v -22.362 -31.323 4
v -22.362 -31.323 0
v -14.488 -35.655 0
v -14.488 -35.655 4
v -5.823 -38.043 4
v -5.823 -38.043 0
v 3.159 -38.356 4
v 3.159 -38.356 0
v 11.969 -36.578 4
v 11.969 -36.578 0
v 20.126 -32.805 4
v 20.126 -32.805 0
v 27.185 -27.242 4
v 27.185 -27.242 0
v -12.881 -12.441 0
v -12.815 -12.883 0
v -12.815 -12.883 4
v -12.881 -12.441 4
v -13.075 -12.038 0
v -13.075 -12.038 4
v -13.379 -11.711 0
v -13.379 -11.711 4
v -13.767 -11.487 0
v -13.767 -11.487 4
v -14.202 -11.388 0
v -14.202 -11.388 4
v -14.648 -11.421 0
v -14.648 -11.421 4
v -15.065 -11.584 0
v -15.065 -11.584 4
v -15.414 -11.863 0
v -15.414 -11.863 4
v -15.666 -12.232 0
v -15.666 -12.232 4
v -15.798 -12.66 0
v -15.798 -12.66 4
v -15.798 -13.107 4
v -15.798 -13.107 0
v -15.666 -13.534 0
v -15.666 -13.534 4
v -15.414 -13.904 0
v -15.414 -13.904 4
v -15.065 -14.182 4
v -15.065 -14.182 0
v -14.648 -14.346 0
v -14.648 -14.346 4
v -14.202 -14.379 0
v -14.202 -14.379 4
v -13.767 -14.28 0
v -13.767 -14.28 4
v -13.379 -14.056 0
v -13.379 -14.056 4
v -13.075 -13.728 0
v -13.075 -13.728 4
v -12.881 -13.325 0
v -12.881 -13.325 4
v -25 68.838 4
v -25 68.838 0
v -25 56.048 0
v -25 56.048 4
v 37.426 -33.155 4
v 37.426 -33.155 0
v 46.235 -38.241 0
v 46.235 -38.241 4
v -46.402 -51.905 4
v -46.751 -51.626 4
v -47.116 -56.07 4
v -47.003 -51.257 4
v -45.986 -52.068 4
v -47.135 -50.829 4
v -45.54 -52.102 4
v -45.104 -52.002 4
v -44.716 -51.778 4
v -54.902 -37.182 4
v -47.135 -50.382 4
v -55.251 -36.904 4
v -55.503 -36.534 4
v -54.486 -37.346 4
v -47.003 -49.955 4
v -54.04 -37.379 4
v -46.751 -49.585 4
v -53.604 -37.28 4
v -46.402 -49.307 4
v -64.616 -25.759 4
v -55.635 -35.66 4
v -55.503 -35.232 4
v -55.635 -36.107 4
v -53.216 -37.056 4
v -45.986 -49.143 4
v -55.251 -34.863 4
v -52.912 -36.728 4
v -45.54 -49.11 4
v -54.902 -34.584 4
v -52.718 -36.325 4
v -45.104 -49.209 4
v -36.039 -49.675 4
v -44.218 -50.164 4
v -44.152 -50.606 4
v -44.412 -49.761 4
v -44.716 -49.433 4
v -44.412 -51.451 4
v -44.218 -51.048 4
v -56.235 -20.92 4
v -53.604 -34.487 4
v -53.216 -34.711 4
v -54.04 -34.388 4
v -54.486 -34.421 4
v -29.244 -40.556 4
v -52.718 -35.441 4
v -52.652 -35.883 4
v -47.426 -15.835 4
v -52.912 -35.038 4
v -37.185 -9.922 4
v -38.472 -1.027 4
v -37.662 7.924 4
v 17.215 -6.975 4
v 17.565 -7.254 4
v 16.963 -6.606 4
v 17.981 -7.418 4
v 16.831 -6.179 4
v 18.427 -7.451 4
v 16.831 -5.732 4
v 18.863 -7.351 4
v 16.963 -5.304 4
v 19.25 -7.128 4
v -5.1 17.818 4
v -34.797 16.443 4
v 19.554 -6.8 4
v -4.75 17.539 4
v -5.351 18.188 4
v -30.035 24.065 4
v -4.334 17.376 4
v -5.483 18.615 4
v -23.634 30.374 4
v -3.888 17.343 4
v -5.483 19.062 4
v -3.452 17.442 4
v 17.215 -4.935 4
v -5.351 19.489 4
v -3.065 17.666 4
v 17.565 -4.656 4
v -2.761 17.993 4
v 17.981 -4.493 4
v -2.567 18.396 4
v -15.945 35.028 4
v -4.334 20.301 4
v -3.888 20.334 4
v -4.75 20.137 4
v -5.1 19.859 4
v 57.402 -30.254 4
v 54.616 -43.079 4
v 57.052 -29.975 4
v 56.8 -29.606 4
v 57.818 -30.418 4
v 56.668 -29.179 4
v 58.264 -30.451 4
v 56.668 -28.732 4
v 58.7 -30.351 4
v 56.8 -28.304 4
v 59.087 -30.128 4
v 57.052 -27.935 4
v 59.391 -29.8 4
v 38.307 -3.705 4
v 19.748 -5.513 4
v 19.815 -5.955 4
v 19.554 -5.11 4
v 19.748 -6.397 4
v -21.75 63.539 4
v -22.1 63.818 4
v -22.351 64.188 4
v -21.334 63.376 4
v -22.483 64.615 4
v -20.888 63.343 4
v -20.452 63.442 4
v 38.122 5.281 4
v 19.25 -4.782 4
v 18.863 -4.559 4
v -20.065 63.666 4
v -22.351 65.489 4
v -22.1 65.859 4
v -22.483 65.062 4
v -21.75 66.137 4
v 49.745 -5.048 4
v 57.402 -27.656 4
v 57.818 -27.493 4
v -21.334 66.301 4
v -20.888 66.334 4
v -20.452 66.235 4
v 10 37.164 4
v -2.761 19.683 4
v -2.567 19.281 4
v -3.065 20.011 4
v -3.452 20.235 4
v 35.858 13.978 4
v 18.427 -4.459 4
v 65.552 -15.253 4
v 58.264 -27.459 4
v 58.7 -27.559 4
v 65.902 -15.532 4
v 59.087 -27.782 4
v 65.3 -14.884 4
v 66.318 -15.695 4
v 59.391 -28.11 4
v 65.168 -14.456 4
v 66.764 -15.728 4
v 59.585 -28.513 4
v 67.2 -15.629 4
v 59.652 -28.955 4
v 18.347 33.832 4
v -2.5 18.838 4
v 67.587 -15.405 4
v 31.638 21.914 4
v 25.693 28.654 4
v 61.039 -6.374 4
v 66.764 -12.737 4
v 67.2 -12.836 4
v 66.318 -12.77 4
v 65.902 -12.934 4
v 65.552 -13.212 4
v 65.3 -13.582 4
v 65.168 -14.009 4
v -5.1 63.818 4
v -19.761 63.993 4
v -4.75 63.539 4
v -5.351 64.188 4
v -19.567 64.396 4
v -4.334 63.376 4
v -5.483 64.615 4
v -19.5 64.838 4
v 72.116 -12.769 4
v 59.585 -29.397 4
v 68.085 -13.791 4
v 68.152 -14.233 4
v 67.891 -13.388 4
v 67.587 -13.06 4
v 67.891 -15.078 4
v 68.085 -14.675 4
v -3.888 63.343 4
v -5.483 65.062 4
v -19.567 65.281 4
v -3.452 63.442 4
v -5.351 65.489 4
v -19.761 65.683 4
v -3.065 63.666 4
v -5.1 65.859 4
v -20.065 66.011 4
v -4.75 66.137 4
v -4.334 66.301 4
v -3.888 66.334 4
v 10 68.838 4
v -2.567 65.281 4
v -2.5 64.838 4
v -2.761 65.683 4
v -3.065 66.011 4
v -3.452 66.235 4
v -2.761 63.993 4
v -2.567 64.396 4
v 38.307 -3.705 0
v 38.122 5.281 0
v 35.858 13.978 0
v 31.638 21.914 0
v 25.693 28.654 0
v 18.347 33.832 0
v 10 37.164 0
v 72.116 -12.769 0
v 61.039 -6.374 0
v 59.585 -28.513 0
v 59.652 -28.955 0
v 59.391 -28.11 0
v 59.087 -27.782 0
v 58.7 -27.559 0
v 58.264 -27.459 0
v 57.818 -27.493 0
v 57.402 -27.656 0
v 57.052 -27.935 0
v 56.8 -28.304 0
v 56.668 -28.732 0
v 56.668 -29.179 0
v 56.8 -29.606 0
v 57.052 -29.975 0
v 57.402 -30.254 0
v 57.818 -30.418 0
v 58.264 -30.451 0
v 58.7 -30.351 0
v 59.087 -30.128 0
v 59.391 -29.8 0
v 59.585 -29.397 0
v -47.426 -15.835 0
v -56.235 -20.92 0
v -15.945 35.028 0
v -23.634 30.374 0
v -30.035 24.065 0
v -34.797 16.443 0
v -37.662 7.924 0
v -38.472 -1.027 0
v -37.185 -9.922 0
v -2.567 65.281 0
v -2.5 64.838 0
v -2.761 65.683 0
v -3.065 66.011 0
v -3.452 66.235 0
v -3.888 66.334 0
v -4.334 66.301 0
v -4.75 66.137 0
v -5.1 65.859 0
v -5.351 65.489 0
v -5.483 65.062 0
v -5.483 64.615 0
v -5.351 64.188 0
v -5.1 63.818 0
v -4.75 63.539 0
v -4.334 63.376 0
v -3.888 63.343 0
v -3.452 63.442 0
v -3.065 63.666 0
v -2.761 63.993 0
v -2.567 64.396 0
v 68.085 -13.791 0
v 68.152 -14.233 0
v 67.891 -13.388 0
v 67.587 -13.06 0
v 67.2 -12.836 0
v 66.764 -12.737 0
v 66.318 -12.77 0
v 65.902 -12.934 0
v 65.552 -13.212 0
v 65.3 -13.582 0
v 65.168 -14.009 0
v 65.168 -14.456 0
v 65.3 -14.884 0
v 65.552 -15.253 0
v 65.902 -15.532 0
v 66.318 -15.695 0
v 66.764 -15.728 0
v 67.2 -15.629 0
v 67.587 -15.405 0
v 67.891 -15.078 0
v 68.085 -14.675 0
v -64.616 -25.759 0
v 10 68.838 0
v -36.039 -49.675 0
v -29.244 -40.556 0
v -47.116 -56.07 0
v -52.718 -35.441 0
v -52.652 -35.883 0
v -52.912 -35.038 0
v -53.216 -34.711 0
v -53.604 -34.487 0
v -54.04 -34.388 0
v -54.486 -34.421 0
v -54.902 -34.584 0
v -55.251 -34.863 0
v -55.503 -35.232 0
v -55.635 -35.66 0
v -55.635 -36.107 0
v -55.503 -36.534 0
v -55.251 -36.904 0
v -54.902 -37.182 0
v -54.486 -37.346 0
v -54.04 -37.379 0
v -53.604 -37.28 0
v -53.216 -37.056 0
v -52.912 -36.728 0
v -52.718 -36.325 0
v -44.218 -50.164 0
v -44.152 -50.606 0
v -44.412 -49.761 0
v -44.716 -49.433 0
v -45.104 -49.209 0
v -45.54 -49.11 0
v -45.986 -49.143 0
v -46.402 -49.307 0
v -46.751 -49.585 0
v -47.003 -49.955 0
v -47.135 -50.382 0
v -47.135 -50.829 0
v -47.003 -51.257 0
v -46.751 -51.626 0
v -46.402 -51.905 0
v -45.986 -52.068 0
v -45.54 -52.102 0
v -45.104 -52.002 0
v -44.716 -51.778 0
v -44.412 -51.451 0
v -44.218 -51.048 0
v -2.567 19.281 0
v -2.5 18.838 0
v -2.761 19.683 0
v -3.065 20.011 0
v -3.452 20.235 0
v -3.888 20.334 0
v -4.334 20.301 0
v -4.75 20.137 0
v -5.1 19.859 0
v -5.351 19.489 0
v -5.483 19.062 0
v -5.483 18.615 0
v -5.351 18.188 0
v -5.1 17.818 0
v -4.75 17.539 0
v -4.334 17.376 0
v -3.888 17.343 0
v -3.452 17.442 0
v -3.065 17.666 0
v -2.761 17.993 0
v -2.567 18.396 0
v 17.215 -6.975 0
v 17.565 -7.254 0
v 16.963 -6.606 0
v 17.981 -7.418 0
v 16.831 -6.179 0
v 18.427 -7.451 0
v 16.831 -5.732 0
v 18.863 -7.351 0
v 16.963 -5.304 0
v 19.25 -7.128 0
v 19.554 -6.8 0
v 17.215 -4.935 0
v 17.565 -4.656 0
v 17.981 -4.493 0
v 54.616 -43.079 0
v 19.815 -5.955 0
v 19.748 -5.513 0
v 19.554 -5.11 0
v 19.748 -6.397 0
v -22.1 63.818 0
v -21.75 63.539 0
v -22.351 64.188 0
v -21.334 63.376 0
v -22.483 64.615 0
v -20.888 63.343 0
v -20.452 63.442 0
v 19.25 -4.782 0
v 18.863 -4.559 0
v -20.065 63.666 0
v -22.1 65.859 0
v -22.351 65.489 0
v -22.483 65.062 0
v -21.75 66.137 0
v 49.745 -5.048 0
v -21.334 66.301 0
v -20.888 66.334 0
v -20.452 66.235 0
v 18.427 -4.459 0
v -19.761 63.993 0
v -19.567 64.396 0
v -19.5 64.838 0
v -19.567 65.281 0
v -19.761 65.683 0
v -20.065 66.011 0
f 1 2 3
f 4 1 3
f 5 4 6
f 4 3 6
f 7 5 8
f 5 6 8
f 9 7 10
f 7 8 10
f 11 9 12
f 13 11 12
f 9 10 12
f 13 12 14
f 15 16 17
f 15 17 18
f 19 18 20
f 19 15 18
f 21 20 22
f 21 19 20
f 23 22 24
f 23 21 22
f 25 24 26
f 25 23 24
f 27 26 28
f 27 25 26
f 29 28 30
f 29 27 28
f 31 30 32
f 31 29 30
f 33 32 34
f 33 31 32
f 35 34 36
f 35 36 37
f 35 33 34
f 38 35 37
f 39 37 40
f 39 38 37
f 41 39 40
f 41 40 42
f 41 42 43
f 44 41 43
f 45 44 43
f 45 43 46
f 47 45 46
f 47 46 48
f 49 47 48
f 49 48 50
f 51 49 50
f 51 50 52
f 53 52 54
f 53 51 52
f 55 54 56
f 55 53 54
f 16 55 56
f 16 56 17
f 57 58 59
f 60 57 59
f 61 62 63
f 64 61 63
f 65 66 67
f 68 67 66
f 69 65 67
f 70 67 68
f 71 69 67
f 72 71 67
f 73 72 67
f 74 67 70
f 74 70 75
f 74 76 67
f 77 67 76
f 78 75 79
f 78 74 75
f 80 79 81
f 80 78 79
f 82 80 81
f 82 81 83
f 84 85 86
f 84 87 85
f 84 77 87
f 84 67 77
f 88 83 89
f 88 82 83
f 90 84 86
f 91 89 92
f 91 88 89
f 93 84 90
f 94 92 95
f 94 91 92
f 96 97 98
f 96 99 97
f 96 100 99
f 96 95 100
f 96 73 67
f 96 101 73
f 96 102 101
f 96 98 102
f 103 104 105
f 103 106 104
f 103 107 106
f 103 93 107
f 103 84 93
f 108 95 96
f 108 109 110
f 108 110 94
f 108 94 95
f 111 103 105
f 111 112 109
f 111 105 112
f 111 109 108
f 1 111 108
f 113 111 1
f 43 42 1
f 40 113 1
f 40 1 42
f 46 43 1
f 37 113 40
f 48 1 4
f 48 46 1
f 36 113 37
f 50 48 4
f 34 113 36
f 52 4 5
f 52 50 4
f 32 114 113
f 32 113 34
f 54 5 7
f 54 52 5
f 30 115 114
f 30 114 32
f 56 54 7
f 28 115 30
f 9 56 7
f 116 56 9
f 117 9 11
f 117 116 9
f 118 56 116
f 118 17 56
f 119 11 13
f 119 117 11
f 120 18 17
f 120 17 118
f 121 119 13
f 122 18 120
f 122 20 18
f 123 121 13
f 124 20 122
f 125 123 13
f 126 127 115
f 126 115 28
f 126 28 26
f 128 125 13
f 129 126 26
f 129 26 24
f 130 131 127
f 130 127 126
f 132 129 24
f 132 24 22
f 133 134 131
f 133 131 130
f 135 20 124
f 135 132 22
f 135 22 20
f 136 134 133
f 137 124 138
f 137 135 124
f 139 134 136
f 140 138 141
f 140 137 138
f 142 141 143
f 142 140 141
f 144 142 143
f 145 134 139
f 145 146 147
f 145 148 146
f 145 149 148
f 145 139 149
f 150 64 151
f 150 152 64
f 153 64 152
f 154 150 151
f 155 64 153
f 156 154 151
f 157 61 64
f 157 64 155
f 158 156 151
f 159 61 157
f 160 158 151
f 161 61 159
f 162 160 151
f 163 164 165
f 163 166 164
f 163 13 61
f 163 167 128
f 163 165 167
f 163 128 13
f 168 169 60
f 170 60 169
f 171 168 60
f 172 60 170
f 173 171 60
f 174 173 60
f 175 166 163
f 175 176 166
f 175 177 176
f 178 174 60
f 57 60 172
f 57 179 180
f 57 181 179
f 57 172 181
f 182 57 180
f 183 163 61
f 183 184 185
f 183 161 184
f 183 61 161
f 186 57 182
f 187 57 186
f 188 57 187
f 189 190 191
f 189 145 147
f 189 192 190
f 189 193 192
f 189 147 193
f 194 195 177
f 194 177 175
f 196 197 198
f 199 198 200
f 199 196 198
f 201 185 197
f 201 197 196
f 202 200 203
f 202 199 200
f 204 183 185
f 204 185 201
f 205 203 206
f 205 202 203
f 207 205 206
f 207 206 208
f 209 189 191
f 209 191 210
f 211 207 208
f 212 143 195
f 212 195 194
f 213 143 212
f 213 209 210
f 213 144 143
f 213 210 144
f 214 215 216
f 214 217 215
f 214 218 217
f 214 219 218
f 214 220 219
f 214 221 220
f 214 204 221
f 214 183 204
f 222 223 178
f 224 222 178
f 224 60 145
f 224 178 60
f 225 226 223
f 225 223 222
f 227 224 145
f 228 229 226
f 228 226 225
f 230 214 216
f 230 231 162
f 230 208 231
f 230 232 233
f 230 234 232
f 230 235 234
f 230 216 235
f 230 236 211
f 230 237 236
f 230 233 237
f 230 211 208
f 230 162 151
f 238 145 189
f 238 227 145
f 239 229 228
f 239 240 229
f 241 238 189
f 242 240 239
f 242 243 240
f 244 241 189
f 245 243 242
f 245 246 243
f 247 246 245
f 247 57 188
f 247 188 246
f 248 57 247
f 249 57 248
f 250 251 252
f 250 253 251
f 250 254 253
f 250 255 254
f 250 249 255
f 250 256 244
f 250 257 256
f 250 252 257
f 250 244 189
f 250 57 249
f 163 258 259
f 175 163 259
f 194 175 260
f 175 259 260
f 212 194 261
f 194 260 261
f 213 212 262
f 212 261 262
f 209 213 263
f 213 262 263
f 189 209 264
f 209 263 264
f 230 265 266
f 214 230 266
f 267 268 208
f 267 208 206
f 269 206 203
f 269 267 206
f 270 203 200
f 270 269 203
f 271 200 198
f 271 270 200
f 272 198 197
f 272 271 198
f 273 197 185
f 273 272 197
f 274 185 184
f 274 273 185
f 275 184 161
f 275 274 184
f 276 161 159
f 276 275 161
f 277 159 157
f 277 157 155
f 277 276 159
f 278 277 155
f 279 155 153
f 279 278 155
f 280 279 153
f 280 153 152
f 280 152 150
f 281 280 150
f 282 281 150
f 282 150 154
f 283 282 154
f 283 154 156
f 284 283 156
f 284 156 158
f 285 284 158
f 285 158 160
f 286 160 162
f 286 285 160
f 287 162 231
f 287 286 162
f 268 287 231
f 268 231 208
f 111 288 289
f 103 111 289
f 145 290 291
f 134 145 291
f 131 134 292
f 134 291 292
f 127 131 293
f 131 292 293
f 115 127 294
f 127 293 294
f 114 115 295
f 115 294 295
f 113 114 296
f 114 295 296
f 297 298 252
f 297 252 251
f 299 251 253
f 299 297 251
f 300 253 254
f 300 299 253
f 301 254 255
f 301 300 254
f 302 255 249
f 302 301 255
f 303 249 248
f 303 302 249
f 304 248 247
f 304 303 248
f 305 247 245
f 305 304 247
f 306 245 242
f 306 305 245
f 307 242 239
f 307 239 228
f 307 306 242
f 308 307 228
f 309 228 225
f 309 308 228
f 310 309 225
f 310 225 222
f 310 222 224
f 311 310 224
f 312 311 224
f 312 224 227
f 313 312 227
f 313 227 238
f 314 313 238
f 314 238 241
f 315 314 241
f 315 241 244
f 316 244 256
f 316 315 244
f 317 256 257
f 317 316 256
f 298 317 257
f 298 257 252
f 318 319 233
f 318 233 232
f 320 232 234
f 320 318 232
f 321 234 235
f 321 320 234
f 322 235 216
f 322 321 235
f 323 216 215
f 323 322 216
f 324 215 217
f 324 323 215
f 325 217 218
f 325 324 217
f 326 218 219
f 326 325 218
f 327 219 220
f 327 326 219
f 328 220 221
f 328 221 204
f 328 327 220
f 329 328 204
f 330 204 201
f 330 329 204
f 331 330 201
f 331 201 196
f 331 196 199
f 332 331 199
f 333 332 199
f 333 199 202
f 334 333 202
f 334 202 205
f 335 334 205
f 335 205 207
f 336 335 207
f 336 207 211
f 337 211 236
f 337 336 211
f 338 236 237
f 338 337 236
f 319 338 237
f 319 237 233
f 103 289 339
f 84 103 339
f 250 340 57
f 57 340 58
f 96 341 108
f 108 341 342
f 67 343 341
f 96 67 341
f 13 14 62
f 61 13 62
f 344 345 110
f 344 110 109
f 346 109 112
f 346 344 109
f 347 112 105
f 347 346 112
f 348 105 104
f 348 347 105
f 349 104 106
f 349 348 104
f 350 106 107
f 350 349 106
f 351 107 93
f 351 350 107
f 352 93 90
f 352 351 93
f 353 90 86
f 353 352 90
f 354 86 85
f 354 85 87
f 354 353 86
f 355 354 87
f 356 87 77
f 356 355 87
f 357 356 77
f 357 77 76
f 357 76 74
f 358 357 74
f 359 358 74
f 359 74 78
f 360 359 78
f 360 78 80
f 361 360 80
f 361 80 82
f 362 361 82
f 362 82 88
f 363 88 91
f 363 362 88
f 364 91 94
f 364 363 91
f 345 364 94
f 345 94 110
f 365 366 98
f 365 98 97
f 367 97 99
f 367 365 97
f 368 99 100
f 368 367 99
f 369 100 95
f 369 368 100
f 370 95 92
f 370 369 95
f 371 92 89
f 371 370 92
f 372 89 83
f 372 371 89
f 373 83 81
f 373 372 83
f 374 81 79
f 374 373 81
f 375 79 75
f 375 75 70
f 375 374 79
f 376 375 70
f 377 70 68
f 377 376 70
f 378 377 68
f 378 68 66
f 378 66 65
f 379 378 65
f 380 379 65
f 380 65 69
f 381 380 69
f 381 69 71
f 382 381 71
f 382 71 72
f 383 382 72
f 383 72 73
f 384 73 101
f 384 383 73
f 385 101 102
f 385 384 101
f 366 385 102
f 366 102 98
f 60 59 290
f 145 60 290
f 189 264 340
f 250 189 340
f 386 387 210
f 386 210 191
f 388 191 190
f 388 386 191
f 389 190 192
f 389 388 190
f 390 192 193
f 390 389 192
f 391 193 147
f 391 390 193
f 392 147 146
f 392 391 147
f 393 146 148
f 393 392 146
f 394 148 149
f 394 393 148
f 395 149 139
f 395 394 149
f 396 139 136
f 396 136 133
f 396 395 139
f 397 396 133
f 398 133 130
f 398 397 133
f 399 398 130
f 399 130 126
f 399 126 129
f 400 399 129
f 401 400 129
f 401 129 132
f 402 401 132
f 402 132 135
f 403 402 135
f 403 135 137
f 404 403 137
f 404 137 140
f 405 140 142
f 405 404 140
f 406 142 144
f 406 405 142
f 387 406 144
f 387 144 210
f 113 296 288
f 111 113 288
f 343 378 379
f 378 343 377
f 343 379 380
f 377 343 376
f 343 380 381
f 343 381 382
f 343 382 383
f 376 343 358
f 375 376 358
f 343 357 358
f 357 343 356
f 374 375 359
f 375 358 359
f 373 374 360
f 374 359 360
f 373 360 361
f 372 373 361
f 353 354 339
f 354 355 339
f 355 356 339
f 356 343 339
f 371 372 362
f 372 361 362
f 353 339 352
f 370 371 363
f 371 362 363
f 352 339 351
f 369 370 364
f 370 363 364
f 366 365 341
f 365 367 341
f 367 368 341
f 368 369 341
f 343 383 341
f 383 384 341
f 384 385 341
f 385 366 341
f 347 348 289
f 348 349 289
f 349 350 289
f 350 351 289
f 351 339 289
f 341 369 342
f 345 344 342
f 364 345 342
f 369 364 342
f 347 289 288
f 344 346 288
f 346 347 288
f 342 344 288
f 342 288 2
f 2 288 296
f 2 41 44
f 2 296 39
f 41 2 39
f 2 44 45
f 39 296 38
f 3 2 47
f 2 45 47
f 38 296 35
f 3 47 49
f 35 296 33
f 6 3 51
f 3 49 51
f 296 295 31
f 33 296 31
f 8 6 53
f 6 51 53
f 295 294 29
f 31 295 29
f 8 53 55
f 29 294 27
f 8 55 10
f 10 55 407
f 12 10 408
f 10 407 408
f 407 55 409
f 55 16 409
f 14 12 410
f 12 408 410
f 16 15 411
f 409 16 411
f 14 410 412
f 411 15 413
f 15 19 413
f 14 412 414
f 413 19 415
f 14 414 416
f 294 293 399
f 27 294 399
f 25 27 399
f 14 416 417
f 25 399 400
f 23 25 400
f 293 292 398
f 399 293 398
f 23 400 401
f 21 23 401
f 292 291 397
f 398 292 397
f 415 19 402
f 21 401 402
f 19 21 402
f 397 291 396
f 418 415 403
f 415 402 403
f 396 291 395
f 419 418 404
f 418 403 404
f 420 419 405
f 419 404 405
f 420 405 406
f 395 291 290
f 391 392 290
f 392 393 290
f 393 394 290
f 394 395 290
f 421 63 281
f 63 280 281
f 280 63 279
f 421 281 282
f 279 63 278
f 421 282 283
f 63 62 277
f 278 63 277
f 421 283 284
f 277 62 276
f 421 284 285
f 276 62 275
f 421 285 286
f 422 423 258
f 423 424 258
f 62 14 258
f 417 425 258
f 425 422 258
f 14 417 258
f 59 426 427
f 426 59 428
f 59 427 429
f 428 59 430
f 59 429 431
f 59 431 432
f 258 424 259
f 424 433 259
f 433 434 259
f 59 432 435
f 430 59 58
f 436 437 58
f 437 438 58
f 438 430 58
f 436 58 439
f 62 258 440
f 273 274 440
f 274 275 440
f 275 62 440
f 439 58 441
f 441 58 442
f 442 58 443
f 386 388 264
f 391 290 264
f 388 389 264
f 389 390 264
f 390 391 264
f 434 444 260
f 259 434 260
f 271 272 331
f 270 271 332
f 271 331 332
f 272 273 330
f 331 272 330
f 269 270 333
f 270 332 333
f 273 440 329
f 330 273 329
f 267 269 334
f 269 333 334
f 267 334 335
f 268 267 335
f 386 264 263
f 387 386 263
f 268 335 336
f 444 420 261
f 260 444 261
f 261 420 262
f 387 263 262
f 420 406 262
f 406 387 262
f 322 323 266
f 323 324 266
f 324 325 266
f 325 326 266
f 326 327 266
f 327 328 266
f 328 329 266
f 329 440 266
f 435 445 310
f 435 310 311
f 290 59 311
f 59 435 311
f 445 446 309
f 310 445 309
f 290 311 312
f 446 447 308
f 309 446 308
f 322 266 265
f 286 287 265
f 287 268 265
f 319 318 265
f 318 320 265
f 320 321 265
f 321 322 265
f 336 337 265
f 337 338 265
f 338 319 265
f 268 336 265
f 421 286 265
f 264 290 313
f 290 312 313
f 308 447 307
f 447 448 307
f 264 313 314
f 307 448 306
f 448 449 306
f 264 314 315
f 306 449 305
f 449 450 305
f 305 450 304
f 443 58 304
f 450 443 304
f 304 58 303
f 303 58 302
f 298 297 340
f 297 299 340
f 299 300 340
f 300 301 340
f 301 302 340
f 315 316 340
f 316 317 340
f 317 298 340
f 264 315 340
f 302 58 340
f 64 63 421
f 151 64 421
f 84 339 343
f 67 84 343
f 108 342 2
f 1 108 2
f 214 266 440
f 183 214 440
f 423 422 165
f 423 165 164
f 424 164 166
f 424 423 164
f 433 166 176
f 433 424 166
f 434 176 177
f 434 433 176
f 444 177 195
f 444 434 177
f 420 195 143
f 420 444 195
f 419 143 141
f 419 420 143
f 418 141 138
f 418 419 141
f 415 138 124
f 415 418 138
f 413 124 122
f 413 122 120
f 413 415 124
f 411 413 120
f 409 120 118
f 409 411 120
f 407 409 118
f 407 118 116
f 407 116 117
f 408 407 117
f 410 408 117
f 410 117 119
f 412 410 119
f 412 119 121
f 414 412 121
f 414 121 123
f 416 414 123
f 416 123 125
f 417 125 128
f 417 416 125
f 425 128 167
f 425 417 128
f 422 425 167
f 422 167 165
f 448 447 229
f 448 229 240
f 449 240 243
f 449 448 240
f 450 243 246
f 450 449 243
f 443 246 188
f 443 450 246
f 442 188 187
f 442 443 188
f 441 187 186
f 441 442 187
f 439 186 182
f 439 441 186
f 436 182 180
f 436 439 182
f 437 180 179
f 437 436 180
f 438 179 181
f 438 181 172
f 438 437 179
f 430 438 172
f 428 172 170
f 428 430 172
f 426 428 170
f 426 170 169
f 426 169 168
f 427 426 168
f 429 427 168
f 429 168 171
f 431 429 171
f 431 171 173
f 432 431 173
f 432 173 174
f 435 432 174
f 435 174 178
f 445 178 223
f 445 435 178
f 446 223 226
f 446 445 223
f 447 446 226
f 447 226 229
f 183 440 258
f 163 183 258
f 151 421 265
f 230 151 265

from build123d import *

# Parameters (mm, degrees)
F0_R     = 1.5
F1_DEPTH = 4


with BuildPart() as f1:
    # F0 (on Top) → F1 (new body)
    with BuildSketch(Plane.XY):
        with BuildLine():
            Line((10, 68.838424), (-25, 68.838424))
            Line((-25, 68.838424), (-25, 56.048434))
            Line((-25, 56.048434), (-15.945247, 35.027615))
            ThreePointArc((-15.945247, 35.027615), (-34.796929, 16.442581), (-37.185223, -9.921893))
            Line((-37.185223, -9.921893), (-47.426407, -15.834643))
            Line((-47.426407, -15.834643), (-56.234754, -20.920145))
            Line((-56.234754, -20.920145), (-64.615824, -25.758958))
            Line((-64.615824, -25.758958), (-47.115824, -56.069847))
            Line((-47.115824, -56.069847), (-36.039368, -49.674852))
            Line((-36.039368, -49.674852), (-29.243596, -40.556283))
            Line((-29.243596, -40.556283), (-22.362181, -31.322797))
            ThreePointArc((-22.362181, -31.322797), (3.158772, -38.356315), (27.185223, -27.242401))
            Line((27.185223, -27.242401), (37.426407, -33.155151))
            Line((37.426407, -33.155151), (46.234754, -38.240653))
            Line((46.234754, -38.240653), (54.615824, -43.079466))
            Line((54.615824, -43.079466), (72.115824, -12.768577))
            Line((72.115824, -12.768577), (61.039368, -6.373582))
            Line((61.039368, -6.373582), (49.744569, -5.047556))
            Line((49.744569, -5.047556), (38.307428, -3.704819))
            ThreePointArc((38.307428, -3.704819), (31.638157, 21.913734), (10, 37.164294))
            Line((10, 37.164294), (10, 59.160798))
            Line((10, 59.160798), (10, 68.838424))
        make_face()
        with Locations((-45.651723, -50.605746)):
            Circle(F0_R, mode=Mode.SUBTRACT)
        with Locations((-54.151723, -35.883314)):
            Circle(F0_R, mode=Mode.SUBTRACT)
        with Locations((-14.314554, -12.883314)):
            Circle(F0_R, mode=Mode.SUBTRACT)
        with Locations((58.151723, -28.955111)):
            Circle(F0_R, mode=Mode.SUBTRACT)
        with Locations((18.314554, -5.955111)):
            Circle(F0_R, mode=Mode.SUBTRACT)
        with Locations((66.651723, -14.232679)):
            Circle(F0_R, mode=Mode.SUBTRACT)
        with Locations((-4, 18.838424)):
            Circle(F0_R, mode=Mode.SUBTRACT)
        with Locations((-21, 64.838424)):
            Circle(F0_R, mode=Mode.SUBTRACT)
        with Locations((-4, 64.838424)):
            Circle(F0_R, mode=Mode.SUBTRACT)
    extrude(amount=F1_DEPTH)


solid = f1.part
